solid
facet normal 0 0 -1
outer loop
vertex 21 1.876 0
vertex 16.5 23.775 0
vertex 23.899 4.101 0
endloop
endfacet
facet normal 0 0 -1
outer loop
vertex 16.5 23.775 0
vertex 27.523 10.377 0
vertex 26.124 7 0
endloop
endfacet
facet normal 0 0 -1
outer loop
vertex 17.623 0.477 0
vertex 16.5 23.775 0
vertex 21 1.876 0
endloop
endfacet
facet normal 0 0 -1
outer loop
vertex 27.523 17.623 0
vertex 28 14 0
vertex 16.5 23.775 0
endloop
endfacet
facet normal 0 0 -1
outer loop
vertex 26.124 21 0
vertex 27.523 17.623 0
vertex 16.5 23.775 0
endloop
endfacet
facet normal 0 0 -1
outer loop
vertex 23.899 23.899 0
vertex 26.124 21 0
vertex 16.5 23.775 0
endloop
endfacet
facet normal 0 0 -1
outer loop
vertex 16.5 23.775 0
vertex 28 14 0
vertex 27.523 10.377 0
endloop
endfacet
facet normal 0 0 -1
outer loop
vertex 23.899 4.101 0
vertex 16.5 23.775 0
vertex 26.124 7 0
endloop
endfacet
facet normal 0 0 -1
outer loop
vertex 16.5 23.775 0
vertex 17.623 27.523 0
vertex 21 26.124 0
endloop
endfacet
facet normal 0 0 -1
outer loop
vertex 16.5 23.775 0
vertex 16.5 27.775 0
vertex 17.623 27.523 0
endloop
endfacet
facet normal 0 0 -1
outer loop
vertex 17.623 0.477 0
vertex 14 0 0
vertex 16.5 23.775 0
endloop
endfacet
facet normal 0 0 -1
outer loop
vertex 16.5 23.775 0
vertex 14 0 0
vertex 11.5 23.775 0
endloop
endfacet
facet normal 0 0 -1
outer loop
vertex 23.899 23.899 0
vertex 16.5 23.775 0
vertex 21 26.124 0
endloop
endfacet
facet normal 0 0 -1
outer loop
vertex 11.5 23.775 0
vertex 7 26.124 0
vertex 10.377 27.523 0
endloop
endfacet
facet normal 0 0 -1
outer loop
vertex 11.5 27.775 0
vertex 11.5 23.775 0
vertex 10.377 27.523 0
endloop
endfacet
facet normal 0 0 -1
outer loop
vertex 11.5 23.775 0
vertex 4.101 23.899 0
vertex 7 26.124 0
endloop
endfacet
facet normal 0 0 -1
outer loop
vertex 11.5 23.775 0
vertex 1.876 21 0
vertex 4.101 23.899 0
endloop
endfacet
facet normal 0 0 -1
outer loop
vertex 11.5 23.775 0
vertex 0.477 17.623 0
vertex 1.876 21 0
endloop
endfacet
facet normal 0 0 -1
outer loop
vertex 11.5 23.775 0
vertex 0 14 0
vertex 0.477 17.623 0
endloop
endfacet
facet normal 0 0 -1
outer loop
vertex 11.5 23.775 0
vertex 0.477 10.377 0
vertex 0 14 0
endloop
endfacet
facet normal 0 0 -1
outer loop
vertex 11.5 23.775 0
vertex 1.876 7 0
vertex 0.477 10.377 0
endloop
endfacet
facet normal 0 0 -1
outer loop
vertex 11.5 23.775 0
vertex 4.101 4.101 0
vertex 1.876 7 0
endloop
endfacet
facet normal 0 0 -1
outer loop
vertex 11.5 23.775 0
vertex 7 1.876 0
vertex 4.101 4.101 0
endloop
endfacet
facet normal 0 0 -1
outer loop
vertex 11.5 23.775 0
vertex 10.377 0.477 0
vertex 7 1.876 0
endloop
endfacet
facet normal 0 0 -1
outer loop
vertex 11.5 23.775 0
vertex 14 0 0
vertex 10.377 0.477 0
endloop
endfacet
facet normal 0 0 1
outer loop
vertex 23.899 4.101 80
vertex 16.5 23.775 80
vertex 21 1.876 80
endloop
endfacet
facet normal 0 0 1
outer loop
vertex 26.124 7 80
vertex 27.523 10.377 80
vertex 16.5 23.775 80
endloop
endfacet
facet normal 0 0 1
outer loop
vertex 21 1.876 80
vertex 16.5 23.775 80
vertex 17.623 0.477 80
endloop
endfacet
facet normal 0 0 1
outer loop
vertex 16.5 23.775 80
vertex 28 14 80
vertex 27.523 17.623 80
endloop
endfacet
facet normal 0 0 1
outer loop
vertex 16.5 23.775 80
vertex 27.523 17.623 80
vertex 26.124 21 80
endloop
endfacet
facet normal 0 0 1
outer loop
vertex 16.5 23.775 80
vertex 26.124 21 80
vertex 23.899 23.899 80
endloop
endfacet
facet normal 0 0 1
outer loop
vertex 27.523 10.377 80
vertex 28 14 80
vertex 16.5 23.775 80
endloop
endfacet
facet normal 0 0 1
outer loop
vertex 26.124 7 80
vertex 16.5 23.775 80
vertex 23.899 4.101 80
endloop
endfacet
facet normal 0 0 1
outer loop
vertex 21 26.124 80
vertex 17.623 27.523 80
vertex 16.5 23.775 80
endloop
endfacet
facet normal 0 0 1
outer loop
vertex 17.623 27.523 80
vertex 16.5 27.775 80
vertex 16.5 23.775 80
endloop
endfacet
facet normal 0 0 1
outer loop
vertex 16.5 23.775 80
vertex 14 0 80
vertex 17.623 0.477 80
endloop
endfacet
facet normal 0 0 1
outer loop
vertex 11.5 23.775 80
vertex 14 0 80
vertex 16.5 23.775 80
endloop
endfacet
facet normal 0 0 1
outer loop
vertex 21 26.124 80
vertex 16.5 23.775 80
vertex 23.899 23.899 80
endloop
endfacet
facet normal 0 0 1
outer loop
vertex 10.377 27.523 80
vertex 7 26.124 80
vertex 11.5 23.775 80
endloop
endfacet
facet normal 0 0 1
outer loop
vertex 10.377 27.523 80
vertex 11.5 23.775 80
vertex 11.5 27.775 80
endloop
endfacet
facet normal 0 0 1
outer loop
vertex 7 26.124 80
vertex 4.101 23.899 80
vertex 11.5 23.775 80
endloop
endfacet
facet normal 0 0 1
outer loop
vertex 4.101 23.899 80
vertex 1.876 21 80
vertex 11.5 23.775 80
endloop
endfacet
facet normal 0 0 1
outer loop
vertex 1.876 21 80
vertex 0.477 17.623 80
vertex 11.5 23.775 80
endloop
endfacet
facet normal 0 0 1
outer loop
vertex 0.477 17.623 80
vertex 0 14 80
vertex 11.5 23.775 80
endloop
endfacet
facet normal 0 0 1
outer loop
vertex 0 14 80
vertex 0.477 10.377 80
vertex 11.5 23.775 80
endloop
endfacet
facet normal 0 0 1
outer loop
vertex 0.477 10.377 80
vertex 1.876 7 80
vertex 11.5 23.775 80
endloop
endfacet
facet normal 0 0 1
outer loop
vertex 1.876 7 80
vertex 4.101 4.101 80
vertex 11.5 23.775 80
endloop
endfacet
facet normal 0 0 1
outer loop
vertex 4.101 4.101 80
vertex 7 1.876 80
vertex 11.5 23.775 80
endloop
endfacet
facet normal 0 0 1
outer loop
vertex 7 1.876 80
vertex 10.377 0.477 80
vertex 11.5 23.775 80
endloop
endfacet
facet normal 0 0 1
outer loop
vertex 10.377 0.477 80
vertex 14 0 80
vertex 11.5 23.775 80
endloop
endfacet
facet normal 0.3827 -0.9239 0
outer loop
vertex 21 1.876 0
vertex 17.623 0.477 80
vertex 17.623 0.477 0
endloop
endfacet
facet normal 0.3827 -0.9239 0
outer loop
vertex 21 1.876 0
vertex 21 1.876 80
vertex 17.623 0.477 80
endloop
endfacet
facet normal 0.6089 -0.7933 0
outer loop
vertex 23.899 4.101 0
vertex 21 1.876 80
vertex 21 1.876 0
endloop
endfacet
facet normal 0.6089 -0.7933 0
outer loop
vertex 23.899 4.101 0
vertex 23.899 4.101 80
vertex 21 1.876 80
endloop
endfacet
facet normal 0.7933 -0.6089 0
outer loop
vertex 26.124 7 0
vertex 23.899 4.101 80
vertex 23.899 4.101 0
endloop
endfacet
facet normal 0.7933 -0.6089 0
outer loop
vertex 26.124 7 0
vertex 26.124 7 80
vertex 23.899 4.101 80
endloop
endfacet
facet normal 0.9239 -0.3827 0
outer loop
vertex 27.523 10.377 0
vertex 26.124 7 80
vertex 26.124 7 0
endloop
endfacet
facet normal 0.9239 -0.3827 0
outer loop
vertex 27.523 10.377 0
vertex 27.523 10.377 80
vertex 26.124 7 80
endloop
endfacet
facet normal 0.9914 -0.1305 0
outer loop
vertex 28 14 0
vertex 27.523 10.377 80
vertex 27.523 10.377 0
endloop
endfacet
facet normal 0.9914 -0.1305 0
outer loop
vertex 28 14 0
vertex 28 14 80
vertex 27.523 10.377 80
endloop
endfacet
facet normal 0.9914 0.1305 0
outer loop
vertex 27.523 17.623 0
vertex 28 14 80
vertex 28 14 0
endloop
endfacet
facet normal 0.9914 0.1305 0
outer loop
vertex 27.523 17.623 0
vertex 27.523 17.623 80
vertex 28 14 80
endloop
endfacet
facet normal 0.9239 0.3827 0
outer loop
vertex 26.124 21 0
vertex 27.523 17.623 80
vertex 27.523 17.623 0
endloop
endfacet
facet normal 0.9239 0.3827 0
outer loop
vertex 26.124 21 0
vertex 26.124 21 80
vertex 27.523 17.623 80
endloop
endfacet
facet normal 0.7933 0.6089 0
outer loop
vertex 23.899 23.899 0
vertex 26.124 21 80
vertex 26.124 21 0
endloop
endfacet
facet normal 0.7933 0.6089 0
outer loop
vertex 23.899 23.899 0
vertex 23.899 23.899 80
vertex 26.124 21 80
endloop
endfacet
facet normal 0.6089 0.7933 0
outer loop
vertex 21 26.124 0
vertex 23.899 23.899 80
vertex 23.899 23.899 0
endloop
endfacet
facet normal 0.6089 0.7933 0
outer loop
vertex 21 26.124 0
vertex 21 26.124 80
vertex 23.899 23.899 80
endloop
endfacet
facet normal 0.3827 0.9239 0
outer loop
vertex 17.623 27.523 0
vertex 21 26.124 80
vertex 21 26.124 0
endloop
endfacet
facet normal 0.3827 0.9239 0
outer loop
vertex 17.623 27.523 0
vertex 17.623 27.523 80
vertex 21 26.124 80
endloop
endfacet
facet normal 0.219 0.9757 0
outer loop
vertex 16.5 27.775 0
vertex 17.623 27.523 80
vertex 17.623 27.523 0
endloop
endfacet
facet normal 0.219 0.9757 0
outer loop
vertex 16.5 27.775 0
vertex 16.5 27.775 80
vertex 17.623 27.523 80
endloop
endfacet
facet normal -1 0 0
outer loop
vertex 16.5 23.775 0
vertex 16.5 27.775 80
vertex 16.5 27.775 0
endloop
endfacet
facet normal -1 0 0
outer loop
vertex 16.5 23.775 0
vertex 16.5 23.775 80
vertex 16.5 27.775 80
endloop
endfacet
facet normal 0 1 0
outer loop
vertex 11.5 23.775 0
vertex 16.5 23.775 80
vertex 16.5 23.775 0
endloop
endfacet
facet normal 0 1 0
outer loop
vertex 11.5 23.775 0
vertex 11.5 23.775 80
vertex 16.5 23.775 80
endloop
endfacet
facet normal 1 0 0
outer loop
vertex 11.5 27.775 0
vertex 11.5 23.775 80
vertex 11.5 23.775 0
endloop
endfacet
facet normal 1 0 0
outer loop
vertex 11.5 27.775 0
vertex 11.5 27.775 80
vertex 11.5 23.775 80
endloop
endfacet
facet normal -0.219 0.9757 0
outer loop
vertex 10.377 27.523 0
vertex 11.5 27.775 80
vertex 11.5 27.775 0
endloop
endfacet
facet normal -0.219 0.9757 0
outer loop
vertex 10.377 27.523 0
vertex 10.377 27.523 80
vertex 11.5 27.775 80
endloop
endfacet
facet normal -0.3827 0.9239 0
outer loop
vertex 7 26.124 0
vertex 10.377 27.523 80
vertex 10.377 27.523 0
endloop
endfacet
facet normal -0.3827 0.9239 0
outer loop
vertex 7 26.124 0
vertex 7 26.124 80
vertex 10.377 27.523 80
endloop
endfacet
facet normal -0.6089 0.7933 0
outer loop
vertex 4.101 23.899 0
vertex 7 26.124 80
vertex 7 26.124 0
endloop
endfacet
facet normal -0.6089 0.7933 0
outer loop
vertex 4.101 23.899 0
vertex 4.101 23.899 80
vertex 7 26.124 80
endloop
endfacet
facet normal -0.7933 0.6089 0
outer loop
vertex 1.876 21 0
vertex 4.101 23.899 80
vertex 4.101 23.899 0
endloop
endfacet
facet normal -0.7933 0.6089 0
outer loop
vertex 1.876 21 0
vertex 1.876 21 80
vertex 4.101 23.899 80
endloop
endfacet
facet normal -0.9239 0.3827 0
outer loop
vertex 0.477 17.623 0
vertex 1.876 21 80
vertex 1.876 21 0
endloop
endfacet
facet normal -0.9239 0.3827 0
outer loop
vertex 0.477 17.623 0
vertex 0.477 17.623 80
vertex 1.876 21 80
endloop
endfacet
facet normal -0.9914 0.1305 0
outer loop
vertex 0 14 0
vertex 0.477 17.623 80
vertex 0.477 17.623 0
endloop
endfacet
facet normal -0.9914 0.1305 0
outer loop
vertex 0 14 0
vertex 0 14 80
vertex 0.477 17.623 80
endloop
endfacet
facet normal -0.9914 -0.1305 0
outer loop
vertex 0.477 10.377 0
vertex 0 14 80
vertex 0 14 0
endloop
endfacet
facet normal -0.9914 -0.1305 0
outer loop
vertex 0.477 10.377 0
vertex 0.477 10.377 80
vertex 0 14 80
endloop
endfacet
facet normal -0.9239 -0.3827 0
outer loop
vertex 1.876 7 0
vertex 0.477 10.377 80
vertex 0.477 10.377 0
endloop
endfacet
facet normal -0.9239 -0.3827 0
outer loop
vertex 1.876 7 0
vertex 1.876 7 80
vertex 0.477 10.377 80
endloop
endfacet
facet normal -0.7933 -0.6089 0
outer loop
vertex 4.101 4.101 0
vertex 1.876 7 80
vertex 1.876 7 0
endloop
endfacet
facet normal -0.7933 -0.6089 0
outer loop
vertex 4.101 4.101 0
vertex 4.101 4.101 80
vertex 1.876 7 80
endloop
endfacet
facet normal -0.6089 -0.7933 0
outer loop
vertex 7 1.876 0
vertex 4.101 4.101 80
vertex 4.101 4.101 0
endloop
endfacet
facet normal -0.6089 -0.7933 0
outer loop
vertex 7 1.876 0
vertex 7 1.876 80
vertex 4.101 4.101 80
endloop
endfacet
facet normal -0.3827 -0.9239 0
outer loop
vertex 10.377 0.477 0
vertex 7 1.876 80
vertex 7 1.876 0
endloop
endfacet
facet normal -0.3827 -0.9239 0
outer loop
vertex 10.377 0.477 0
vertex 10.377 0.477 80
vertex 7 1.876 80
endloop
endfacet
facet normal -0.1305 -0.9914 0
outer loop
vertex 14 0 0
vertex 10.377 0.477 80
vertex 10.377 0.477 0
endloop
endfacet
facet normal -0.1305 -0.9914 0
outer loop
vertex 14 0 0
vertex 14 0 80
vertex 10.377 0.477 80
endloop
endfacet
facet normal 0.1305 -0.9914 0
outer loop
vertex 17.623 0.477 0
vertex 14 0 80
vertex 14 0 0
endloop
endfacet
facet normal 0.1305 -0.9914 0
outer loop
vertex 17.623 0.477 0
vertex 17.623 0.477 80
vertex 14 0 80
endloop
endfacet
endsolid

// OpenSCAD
$fn = 32;

// ----------------------------------------------------------------------
// Keyway shaft: d28 shaft, key 5 x 4 mm
// ----------------------------------------------------------------------

// --- parameters (mm) ---
shaft_r = 14;             // shaft radius
key_w = 5;                // keyway width
key_d = 4;                // keyway depth below the surface line
plate_t = 80;             // shaft length, Z (extrusion height)
fit_tol = 0.1;            // declared fit tolerance (prompt contract)
free_tol = 0.5;           // declared free tolerance (prompt contract)

shaft_d = 2 * shaft_r;  // shaft diameter
circle_step = 15;  // polygon sampling step, degrees

profile = [[10.377, 27.523], [7, 26.124], [4.101, 23.899], [1.876, 21], [0.477, 17.623], [0, 14], [0.477, 10.377], [1.876, 7], [4.101, 4.101], [7, 1.876], [10.377, 0.477], [14, 0], [17.623, 0.477], [21, 1.876], [23.899, 4.101], [26.124, 7], [27.523, 10.377], [28, 14], [27.523, 17.623], [26.124, 21], [23.899, 23.899], [21, 26.124], [17.623, 27.523], [16.5, 27.775], [16.5, 23.775], [11.5, 23.775], [11.5, 27.775]];  // primary outline, 27 points, counter clockwise

// --- the one profile operation ---
linear_extrude(height = plate_t) polygon(points = profile);
